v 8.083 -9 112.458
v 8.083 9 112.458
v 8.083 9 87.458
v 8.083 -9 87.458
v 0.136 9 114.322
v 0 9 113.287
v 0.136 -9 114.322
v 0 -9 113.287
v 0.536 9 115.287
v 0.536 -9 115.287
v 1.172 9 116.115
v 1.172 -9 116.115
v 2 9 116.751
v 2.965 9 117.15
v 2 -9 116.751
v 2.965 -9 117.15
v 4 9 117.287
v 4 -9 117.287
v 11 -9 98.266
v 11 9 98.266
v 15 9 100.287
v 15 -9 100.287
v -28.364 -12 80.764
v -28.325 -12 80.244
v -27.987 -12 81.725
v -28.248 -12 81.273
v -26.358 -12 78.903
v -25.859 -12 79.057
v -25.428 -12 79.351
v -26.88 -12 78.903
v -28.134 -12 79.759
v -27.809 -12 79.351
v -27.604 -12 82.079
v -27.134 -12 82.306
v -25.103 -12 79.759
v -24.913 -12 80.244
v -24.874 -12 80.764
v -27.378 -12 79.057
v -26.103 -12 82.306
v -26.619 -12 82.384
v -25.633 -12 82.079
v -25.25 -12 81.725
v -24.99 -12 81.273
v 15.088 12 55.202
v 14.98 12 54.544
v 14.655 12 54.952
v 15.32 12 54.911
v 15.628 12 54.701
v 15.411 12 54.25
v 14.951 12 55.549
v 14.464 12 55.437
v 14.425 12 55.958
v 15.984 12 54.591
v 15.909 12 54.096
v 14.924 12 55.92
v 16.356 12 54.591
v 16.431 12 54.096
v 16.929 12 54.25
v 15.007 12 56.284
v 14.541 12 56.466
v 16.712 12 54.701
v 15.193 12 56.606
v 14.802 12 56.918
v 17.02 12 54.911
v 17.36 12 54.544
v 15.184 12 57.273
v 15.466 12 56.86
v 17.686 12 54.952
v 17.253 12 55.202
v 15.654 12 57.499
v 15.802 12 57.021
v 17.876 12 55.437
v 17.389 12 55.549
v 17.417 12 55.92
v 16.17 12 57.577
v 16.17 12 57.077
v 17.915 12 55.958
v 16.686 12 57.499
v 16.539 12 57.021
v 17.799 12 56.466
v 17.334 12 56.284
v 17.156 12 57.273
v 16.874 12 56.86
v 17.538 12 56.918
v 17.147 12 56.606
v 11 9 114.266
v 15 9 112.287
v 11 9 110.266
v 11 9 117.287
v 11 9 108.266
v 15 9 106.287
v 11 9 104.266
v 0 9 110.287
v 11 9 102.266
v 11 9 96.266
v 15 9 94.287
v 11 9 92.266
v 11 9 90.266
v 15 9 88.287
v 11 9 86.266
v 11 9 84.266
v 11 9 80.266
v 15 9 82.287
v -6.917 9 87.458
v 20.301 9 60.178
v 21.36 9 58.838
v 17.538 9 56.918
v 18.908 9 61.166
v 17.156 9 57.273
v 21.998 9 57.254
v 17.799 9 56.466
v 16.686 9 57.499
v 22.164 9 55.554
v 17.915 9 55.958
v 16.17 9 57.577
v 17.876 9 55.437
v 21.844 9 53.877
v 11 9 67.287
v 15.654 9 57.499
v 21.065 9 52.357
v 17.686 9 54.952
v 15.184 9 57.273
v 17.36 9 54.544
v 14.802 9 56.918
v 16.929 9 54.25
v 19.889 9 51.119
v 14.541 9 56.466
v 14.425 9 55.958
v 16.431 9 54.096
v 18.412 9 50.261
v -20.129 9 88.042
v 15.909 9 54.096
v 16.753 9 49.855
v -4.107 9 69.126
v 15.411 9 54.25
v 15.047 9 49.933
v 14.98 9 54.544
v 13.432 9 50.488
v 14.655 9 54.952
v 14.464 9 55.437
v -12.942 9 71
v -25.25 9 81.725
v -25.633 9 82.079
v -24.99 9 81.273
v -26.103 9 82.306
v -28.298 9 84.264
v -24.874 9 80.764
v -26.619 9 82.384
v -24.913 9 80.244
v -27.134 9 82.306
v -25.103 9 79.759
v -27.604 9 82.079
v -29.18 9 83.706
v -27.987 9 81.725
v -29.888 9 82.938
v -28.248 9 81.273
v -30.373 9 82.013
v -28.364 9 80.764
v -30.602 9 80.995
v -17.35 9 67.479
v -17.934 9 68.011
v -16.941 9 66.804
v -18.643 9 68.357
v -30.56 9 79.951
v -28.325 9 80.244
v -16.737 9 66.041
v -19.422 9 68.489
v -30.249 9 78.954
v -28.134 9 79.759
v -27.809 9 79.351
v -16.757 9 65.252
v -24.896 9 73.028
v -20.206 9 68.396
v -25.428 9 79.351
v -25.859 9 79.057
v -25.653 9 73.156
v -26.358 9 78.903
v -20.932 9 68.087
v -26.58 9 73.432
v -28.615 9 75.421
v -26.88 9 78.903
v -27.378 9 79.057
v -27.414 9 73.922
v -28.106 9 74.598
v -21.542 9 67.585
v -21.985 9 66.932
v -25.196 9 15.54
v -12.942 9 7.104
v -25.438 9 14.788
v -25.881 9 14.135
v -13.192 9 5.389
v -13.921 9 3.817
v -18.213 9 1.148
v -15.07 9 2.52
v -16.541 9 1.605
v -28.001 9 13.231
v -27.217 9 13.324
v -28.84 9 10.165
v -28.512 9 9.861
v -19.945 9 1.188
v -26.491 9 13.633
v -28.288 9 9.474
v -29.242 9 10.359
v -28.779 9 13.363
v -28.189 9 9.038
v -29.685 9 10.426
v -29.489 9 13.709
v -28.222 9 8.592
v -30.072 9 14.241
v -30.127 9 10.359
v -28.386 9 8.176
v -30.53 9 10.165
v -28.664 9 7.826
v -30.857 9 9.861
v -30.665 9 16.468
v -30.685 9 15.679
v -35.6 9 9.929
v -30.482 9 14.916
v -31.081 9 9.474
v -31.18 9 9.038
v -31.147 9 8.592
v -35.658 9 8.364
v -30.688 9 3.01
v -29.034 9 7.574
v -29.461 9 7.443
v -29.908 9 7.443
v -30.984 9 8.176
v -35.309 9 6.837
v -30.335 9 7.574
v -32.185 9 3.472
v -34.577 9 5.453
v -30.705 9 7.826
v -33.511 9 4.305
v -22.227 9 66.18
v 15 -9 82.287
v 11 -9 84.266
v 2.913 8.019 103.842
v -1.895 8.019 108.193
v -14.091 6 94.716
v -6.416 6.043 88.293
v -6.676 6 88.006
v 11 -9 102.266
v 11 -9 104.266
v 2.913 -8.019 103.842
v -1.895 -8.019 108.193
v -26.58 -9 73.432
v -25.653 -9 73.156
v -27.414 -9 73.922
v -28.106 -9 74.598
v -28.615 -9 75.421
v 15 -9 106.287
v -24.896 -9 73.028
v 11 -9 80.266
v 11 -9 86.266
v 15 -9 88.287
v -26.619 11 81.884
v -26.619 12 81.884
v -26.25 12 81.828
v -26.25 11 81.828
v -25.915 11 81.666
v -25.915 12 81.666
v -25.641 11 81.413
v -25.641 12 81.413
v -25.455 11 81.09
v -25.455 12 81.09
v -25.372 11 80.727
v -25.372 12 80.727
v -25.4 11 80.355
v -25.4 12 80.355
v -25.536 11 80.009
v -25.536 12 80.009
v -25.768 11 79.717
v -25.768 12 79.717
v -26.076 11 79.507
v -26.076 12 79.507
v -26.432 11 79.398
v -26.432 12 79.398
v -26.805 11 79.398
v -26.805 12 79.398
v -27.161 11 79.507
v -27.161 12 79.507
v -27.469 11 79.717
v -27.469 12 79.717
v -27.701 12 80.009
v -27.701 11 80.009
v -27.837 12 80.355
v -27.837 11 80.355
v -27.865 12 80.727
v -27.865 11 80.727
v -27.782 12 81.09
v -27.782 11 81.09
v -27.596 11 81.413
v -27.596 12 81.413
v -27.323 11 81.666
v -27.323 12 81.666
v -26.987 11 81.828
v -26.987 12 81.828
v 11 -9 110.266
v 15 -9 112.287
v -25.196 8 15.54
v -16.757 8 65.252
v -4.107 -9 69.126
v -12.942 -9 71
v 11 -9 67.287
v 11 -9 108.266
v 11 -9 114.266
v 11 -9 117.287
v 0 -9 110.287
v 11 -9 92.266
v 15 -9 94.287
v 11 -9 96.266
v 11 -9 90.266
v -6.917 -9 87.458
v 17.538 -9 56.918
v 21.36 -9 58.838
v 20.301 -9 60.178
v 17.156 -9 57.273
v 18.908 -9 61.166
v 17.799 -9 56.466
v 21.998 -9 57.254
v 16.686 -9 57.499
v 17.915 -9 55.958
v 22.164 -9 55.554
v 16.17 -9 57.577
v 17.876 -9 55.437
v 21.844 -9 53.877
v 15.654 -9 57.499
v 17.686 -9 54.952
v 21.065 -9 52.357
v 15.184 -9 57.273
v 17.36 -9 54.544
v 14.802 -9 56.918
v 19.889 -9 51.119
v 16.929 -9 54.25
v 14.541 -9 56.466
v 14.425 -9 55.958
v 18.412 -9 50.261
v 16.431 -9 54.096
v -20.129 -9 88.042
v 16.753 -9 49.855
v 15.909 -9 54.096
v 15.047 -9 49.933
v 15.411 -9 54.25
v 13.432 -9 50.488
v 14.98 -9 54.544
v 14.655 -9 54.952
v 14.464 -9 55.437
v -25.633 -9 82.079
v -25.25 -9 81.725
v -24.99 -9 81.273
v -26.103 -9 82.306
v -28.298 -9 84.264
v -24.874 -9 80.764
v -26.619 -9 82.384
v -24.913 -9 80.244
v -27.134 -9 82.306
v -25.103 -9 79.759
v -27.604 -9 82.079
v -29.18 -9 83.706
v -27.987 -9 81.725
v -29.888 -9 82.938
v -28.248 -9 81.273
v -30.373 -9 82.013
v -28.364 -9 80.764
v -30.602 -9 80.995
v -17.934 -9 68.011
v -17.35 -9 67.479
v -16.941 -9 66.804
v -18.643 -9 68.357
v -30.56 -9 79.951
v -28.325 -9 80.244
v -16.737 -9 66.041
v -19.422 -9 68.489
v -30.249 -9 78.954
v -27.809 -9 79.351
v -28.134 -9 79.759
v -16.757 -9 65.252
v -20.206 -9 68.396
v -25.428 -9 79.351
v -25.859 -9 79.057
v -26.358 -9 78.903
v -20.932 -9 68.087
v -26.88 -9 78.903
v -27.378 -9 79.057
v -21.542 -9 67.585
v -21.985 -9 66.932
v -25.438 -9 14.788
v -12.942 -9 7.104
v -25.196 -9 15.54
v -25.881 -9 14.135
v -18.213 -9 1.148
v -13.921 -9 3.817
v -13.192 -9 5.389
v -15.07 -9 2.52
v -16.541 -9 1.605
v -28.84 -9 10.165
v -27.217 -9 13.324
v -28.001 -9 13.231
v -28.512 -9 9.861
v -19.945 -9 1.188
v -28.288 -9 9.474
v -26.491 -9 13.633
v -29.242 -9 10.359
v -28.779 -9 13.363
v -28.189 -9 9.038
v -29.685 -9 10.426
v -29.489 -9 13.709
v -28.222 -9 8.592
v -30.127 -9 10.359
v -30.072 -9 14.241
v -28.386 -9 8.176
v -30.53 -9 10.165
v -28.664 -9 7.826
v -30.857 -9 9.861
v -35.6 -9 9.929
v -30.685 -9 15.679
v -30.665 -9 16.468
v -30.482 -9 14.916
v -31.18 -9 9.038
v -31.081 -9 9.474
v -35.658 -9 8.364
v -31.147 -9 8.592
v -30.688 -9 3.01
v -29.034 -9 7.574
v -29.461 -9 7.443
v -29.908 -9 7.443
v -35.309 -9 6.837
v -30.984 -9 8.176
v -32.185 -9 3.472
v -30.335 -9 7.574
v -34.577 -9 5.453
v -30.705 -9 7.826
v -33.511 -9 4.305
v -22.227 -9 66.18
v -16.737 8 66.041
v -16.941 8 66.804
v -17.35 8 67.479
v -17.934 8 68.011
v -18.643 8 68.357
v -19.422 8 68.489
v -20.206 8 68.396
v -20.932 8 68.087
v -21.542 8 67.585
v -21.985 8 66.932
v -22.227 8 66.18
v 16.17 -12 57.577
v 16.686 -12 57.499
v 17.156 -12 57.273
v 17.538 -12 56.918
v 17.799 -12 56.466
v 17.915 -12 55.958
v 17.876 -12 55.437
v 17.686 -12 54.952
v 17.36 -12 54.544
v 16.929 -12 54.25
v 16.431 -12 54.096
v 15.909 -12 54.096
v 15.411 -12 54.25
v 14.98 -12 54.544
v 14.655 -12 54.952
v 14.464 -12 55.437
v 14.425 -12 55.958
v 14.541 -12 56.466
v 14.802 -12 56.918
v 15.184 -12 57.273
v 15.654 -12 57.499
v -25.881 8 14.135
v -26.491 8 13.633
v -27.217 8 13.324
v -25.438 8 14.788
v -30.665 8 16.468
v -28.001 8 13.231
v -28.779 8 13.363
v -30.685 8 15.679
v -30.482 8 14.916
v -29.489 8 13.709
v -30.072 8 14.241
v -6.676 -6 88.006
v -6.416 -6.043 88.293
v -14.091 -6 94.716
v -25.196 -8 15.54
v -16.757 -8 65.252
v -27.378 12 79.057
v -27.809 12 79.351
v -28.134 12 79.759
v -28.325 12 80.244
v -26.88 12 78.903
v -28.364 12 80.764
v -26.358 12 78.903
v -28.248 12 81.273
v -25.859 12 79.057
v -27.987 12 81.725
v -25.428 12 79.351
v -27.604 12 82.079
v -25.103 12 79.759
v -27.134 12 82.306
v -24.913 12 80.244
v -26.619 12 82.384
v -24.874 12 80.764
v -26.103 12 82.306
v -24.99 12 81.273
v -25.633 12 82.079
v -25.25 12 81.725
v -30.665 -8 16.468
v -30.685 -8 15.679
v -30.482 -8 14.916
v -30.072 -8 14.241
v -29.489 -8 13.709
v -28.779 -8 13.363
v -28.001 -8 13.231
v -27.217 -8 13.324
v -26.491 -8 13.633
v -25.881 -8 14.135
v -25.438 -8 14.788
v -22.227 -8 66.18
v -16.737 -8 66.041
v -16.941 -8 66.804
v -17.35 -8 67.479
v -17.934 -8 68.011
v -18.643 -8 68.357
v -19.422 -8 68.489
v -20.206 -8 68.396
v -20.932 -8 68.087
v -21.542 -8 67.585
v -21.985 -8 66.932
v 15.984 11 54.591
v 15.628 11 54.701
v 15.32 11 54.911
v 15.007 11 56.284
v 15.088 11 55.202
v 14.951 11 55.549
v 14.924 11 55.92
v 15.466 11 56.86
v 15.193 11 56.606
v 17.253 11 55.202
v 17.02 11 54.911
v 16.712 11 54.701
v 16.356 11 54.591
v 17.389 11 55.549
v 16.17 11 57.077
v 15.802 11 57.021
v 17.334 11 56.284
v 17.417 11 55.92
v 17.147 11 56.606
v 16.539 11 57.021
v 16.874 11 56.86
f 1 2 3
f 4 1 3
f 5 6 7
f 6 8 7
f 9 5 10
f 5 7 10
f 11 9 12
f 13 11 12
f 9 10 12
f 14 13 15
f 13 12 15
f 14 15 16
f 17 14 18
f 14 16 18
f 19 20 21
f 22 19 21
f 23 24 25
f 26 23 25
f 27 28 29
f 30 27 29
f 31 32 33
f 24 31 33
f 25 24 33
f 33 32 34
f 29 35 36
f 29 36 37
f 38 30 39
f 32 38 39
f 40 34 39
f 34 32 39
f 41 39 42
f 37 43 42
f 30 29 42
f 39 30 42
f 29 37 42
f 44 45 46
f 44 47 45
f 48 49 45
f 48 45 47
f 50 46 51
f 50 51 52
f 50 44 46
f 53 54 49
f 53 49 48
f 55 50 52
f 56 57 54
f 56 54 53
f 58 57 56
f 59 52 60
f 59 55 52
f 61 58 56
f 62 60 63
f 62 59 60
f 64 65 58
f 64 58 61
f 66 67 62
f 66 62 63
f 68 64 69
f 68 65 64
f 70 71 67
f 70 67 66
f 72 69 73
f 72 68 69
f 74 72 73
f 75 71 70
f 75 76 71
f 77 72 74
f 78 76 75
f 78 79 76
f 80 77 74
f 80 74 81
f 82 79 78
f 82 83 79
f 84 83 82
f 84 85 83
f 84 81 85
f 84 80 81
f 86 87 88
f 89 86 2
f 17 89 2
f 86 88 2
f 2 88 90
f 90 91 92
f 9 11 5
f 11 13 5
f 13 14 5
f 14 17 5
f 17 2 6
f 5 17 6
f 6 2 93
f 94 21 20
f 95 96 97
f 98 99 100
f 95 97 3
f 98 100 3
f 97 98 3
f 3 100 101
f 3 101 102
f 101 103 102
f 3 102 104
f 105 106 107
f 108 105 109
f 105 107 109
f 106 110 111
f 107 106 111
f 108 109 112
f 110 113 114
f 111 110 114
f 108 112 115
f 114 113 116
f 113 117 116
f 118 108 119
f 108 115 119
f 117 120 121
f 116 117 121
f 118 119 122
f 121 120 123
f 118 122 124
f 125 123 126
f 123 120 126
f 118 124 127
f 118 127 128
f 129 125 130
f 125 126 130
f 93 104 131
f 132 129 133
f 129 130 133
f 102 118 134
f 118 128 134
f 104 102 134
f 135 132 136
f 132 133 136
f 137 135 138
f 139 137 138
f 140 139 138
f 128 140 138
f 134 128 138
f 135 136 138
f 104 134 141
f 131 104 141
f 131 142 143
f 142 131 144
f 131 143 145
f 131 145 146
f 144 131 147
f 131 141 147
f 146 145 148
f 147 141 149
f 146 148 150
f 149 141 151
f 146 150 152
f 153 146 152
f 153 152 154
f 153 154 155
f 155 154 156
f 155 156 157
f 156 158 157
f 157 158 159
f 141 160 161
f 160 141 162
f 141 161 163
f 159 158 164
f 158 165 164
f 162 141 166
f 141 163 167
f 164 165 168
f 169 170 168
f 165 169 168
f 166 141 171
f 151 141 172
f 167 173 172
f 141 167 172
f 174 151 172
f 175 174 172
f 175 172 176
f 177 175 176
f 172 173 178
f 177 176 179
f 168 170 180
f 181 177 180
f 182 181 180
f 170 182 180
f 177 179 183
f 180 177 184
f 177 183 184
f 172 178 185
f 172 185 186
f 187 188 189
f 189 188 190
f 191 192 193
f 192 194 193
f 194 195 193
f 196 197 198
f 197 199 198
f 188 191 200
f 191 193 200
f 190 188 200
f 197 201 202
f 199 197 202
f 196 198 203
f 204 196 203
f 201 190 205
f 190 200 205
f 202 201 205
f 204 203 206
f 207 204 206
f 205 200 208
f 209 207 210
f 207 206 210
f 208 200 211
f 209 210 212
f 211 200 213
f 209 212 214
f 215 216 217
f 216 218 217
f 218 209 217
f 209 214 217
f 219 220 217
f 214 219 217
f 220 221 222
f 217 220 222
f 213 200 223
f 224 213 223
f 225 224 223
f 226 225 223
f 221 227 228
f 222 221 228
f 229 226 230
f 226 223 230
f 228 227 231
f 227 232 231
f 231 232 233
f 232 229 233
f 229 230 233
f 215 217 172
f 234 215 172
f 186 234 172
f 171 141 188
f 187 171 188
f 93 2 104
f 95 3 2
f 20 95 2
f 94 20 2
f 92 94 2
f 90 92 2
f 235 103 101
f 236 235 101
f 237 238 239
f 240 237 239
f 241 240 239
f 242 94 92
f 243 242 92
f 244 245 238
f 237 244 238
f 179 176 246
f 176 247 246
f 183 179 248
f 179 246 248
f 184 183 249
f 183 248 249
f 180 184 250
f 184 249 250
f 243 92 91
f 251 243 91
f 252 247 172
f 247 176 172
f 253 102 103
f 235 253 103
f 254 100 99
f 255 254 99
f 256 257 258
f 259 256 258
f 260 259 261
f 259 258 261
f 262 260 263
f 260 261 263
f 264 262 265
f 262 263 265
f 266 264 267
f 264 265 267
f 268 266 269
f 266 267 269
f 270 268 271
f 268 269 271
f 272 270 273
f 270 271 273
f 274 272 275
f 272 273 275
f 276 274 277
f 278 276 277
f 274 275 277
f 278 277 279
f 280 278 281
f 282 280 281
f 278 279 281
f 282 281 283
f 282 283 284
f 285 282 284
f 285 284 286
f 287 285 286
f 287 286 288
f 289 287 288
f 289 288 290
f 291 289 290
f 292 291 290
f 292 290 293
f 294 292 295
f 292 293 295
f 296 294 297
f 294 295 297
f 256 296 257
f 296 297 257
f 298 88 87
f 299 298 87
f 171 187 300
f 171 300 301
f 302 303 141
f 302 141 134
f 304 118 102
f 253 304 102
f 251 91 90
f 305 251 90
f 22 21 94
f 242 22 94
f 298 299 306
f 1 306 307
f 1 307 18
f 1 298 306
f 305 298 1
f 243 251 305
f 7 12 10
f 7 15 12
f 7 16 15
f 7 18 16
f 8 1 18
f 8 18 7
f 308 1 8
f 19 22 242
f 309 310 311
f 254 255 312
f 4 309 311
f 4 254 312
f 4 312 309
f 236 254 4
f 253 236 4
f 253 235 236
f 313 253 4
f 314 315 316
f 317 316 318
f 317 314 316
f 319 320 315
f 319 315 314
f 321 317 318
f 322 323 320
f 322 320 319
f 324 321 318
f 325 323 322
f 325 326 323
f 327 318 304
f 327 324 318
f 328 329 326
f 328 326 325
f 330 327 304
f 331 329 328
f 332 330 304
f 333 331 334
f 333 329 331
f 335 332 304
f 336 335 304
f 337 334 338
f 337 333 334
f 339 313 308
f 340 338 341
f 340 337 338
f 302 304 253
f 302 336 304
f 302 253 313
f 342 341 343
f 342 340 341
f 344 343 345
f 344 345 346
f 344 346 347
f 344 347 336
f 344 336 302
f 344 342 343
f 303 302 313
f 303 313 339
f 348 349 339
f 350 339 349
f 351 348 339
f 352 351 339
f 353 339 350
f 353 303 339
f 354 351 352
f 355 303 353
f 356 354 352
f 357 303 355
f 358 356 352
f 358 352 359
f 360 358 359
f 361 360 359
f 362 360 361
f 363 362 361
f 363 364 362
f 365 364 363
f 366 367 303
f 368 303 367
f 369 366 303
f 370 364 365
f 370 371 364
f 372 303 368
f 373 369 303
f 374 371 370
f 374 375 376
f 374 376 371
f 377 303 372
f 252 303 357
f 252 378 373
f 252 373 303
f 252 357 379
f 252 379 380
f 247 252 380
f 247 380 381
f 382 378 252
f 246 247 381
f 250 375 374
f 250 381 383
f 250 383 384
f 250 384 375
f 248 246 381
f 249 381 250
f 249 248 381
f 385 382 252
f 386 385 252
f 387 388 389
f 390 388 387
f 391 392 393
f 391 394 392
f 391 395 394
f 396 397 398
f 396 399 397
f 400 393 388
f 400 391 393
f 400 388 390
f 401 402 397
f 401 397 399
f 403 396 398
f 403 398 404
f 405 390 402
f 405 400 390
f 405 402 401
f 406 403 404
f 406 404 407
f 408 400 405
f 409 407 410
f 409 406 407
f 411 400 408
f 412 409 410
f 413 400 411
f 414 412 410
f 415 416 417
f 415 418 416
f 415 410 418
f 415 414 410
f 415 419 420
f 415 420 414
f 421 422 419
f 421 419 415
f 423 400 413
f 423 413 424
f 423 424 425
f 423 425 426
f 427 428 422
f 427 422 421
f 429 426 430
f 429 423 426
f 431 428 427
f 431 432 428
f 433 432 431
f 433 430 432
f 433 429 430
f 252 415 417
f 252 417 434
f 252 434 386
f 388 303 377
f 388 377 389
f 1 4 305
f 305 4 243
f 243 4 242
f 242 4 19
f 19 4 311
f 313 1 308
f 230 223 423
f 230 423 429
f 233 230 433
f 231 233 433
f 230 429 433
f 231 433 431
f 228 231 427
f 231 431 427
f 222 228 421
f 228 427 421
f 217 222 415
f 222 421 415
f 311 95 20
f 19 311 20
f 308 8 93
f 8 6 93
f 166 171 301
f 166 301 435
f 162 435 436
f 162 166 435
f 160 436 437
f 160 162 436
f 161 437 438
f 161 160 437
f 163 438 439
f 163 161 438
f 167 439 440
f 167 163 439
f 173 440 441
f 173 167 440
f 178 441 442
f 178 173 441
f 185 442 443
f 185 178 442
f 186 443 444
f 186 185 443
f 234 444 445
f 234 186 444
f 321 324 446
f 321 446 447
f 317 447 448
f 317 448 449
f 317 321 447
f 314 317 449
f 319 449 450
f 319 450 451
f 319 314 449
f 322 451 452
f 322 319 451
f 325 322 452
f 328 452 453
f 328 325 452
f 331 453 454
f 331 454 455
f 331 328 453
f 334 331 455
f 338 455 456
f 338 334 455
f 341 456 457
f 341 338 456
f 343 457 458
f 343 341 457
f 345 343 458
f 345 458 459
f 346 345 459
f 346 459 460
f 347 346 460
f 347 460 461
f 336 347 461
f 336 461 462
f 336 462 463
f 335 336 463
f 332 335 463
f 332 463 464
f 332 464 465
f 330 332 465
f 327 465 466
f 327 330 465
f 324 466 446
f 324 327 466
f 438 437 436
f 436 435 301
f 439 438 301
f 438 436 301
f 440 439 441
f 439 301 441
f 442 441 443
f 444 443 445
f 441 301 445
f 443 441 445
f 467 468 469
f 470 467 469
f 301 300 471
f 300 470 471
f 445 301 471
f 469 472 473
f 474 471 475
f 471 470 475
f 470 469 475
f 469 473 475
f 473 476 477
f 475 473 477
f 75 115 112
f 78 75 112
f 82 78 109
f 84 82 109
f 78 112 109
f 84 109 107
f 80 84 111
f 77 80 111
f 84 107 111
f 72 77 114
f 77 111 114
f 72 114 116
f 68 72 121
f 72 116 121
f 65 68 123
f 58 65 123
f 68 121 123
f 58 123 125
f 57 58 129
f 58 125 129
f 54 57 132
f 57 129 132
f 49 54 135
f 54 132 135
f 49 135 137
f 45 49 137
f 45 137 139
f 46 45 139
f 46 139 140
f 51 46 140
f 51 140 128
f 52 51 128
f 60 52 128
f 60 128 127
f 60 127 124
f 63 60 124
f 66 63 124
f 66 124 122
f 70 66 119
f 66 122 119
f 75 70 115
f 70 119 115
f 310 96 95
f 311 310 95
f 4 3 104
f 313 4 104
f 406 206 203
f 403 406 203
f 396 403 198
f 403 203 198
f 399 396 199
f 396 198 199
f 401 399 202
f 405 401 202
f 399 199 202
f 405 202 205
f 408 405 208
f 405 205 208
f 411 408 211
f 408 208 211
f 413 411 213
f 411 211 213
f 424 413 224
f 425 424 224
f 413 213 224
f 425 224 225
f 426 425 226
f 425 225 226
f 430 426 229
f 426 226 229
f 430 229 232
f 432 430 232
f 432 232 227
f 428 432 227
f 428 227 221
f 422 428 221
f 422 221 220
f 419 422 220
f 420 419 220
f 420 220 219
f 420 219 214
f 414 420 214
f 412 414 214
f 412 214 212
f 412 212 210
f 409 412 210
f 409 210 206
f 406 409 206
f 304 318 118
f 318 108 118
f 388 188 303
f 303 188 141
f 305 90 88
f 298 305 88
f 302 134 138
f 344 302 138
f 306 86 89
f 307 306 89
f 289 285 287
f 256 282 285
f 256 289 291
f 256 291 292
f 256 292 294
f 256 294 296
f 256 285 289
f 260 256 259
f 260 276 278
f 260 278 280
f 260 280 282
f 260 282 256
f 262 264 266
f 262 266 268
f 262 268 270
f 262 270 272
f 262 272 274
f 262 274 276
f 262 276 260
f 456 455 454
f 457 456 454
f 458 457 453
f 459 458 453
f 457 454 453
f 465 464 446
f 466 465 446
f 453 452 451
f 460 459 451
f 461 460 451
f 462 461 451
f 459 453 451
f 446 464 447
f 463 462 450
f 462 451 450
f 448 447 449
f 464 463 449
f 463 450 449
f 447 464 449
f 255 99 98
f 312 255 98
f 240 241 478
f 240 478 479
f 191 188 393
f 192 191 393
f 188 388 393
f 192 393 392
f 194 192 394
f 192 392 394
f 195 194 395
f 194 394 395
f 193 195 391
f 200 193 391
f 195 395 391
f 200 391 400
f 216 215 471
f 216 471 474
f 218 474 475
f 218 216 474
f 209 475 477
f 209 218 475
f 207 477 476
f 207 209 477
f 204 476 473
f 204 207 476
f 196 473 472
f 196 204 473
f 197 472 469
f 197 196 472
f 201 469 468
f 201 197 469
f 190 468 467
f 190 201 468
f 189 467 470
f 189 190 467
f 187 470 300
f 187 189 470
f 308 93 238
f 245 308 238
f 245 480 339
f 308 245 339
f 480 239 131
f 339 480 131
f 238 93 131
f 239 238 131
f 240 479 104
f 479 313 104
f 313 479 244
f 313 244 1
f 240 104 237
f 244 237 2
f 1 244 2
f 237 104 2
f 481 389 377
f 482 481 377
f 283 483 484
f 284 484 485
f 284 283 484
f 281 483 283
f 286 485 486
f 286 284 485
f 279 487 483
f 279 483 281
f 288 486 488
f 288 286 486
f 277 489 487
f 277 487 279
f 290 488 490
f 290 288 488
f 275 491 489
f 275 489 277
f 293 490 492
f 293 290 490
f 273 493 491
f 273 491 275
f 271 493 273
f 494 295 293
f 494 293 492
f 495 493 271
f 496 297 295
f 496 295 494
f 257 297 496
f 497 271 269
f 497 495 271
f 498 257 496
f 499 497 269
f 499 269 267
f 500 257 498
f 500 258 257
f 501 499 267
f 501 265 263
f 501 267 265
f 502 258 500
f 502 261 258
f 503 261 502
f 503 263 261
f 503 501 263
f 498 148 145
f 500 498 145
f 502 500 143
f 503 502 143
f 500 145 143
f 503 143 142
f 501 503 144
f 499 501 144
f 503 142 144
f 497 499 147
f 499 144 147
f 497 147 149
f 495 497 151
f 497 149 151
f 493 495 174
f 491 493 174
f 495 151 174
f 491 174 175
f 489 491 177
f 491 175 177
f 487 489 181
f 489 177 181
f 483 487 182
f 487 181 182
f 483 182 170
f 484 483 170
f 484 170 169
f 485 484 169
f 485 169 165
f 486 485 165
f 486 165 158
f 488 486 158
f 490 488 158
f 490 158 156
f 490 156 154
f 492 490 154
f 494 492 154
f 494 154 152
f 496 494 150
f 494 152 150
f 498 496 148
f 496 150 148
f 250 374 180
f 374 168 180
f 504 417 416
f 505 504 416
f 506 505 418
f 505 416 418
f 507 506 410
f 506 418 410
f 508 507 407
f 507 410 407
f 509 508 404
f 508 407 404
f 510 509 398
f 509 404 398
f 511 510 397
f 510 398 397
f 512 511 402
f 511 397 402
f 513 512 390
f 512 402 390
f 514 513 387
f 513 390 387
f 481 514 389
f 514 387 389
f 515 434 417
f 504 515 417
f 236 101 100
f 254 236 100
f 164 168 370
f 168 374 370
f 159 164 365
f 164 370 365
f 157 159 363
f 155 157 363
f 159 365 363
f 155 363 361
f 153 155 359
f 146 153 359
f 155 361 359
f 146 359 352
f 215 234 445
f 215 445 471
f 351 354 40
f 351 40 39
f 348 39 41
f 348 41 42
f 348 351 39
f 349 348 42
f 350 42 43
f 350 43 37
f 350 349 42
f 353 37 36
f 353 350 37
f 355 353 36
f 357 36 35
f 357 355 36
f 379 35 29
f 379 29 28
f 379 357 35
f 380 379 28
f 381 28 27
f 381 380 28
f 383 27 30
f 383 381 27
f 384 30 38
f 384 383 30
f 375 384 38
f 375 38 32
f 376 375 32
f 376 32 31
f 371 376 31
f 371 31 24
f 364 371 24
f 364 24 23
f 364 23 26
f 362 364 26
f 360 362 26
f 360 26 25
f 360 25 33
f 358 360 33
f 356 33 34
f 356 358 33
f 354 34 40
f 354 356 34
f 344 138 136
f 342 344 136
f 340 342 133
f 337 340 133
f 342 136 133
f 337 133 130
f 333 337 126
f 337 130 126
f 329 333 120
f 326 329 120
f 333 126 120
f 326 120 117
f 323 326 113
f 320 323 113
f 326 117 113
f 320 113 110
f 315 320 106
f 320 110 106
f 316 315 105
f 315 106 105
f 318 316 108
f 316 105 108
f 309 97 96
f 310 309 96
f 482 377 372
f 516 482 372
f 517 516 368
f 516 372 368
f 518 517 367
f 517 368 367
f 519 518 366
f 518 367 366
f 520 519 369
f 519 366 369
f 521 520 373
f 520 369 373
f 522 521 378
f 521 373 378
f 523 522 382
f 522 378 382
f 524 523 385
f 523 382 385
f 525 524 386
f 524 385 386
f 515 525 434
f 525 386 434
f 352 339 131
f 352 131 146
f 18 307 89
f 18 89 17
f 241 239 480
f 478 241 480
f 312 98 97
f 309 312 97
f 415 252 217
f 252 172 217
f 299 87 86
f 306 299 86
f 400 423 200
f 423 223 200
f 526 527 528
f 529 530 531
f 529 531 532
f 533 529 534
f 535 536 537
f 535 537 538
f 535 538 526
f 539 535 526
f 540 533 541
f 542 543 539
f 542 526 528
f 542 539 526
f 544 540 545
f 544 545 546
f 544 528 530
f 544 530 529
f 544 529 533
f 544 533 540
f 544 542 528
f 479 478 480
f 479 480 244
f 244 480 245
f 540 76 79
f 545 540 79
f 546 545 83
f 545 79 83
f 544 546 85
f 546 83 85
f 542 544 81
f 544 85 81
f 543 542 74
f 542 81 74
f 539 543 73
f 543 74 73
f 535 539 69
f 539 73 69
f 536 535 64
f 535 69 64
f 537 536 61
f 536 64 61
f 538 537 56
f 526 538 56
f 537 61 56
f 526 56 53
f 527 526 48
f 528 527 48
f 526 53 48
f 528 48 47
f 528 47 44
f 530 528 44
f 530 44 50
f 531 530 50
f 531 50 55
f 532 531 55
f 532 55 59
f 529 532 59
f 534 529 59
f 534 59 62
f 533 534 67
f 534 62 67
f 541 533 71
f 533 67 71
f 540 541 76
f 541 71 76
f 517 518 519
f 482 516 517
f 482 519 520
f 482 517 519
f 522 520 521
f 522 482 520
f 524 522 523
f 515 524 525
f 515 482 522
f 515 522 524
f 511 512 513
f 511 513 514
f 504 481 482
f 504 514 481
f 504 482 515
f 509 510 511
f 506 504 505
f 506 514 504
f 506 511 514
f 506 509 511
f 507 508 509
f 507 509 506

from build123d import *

# Parameters (mm, degrees)
BOSS_EXTRUDE1_DEPTH = 9
FILLET1_R           = 6
FILLET2_R           = 4
BOSS_EXTRUDE2_DEPTH = 18
LPATTERN1_COUNT     = 6
LPATTERN1_PITCH     = 6
CUT_EXTRUDE1_DEPTH  = 26
CUT_EXTRUDE3_DEPTH  = 10
SKETCH5_R           = 1.5
CUT_EXTRUDE4_DEPTH  = 124.909348227
SKETCH6_R           = 1.75
BOSS_EXTRUDE3_DEPTH = 3
SKETCH7_R           = 1.25
CUT_EXTRUDE6_DEPTH  = 1
SKETCH8_R           = 1.25
CUT_EXTRUDE7_DEPTH  = 1
CUT_EXTRUDE8_DEPTH  = 1


with BuildPart() as part:
    # Sketch1 → Boss-Extrude1 (new, symmetric)
    with BuildSketch(Plane(origin=(0, 0, 0), x_dir=(1, 0, 0), z_dir=(0, 1, 0))):
        with BuildLine():
            ThreePointArc((13.432245527, -50.487906924), (21.509028276, -53.088979862), (18.907955338, -61.165762611))
            Line((18.907955338, -61.165762611), (11, -67.286566673))
            Line((11, -67.286566673), (11, -117.286566673))
            Line((11, -117.286566673), (0, -117.286566673))
            Line((0, -117.286566673), (0, -110.286566673))
            Line((0, -110.286566673), (-20.129396013, -88.042299634))
            Line((-20.129396013, -88.042299634), (-31.928362438, -82.58479184))
            Line((-31.928362438, -82.58479184), (-27.730279519, -73.508663821))
            Line((-27.730279519, -73.508663821), (-24.896421124, -73.027946621))
            Line((-24.896421124, -73.027946621), (-12.941547125, -71))
            Line((-12.941547125, -71), (-4.10711559, -69.126148868))
            Line((-4.10711559, -69.126148868), (13.432245527, -50.487906924))
        make_face()
        Polygon((-12.941547125, -71), (-24.896421124, -73.027946621), (-36.603518956, -4.013862114), (-12.941547125, 0), align=None)
    extrude(amount=BOSS_EXTRUDE1_DEPTH, both=True)

    # Fillet1
    fillet1_edges = [part.edges().sort_by_distance(p)[0] for p in [
        (-36.603518956, 0, 4.013862114),
        (-12.941547125, 0, 0),
    ]]
    fillet(fillet1_edges, radius=FILLET1_R)

    # Fillet2
    fillet2_edges = [part.edges().sort_by_distance(p)[0] for p in [
        (0, 0, 117.286566673),
        (-31.928362438, 0, 82.58479184),
        (-27.730279519, 0, 73.508663821),
    ]]
    fillet(fillet2_edges, radius=FILLET2_R)

    # Sketch2 → Boss-Extrude2 (add)
    with BuildSketch(Plane(origin=(0, 9, 0), x_dir=(1, 0, 0), z_dir=(0, 1, 0))):
        Polygon((15, -112.286566673), (11, -114.265571656), (11, -110.265571656), align=None)
    boss_extrude2 = extrude(amount=-BOSS_EXTRUDE2_DEPTH)

    # LPattern1: Boss-Extrude2 ×6
    with Locations(*[(0, 0, -i * LPATTERN1_PITCH) for i in range(1, LPATTERN1_COUNT)]):
        add(boss_extrude2)

    # Sketch3 → Cut-Extrude1 (cut)
    with BuildSketch(Plane(origin=(0, 9, 0), x_dir=(1, 0, 0), z_dir=(0, 1, 0))):
        Polygon((8.082911966, -112.457569416), (8.082911966, -87.457569416), (-6.917088034, -87.457569416), align=None)
    extrude(amount=-CUT_EXTRUDE1_DEPTH, mode=Mode.SUBTRACT)

    # Sketch4 → Cut-Extrude3 (cut)
    with BuildSketch(Plane(origin=(-54.869240858, 0, 49.65255435), x_dir=(0.6709798671072843, 0, 0.7414755679971466), z_dir=(-0.7414755679971466, 0, 0.6709798671072843))):
        Polygon((60.774794667, 6), (60.774794667, -6), (78.951118156, -8.019187605), (78.951118156, 8.019187605), align=None)
    extrude(amount=-CUT_EXTRUDE3_DEPTH, mode=Mode.SUBTRACT)

    # Sketch5 → Cut-Extrude4 (cut, through all)
    with BuildSketch(Plane(origin=(0, 9, 0), x_dir=(1, 0, 0), z_dir=(0, 1, 0))):
        with Locations(Location((-29.68456047, -8.925889543, 0), (0, 0, 270))):
            Circle(SKETCH5_R)
    extrude(amount=-CUT_EXTRUDE4_DEPTH, mode=Mode.SUBTRACT)

    # Sketch6 → Boss-Extrude3 (add)
    with BuildSketch(Plane(origin=(0, 9, 0), x_dir=(1, 0, 0), z_dir=(0, 1, 0))):
        with Locations(Location((-26.618678063, -80.6335738, 0), (0, 0, 270))):
            Circle(SKETCH6_R)
        with Locations(Location((16.170100432, -55.826834767, 0), (0, 0, 270))):
            Circle(SKETCH6_R)
    boss_extrude3 = extrude(amount=BOSS_EXTRUDE3_DEPTH)

    # Sketch7 → Cut-Extrude6 (cut)
    with BuildSketch(Plane(origin=(0, 12, 0), x_dir=(1, 0, 0), z_dir=(0, 1, 0))):
        with Locations(Location((-26.618678063, -80.6335738, 0), (0, 0, 270))):
            Circle(SKETCH7_R)
    extrude(amount=-CUT_EXTRUDE6_DEPTH, mode=Mode.SUBTRACT)

    # Sketch8 → Cut-Extrude7 (cut)
    with BuildSketch(Plane(origin=(0, 12, 0), x_dir=(1, 0, 0), z_dir=(0, 1, 0))):
        with Locations(Location((16.170100432, -55.826834767, 0), (0, 0, 270))):
            Circle(SKETCH8_R)
    extrude(amount=-CUT_EXTRUDE7_DEPTH, mode=Mode.SUBTRACT)

    # Sketch9 → Cut-Extrude8 (cut)
    with BuildSketch(Plane(origin=(0, 9, 0), x_dir=(1, 0, 0), z_dir=(0, 1, 0))):
        with BuildLine():
            Line((-25.196199852, -15.539852581), (-16.757464085, -65.251677823))
            ThreePointArc((-16.757464085, -65.251677823), (-19.027845143, -68.450467492), (-22.226634811, -66.180086434))
            Line((-22.226634811, -66.180086434), (-30.665370577, -16.468261192))
            ThreePointArc((-30.665370577, -16.468261192), (-28.39498952, -13.269471524), (-25.196199852, -15.539852581))
        make_face()
    cut_extrude8 = extrude(amount=-CUT_EXTRUDE8_DEPTH, mode=Mode.SUBTRACT)

    # Mirror1: Boss-Extrude3, Cut-Extrude8 across plane
    add(boss_extrude3.mirror(Plane.ZX))
    add(cut_extrude8.mirror(Plane.ZX), mode=Mode.SUBTRACT)


solid = part.part
